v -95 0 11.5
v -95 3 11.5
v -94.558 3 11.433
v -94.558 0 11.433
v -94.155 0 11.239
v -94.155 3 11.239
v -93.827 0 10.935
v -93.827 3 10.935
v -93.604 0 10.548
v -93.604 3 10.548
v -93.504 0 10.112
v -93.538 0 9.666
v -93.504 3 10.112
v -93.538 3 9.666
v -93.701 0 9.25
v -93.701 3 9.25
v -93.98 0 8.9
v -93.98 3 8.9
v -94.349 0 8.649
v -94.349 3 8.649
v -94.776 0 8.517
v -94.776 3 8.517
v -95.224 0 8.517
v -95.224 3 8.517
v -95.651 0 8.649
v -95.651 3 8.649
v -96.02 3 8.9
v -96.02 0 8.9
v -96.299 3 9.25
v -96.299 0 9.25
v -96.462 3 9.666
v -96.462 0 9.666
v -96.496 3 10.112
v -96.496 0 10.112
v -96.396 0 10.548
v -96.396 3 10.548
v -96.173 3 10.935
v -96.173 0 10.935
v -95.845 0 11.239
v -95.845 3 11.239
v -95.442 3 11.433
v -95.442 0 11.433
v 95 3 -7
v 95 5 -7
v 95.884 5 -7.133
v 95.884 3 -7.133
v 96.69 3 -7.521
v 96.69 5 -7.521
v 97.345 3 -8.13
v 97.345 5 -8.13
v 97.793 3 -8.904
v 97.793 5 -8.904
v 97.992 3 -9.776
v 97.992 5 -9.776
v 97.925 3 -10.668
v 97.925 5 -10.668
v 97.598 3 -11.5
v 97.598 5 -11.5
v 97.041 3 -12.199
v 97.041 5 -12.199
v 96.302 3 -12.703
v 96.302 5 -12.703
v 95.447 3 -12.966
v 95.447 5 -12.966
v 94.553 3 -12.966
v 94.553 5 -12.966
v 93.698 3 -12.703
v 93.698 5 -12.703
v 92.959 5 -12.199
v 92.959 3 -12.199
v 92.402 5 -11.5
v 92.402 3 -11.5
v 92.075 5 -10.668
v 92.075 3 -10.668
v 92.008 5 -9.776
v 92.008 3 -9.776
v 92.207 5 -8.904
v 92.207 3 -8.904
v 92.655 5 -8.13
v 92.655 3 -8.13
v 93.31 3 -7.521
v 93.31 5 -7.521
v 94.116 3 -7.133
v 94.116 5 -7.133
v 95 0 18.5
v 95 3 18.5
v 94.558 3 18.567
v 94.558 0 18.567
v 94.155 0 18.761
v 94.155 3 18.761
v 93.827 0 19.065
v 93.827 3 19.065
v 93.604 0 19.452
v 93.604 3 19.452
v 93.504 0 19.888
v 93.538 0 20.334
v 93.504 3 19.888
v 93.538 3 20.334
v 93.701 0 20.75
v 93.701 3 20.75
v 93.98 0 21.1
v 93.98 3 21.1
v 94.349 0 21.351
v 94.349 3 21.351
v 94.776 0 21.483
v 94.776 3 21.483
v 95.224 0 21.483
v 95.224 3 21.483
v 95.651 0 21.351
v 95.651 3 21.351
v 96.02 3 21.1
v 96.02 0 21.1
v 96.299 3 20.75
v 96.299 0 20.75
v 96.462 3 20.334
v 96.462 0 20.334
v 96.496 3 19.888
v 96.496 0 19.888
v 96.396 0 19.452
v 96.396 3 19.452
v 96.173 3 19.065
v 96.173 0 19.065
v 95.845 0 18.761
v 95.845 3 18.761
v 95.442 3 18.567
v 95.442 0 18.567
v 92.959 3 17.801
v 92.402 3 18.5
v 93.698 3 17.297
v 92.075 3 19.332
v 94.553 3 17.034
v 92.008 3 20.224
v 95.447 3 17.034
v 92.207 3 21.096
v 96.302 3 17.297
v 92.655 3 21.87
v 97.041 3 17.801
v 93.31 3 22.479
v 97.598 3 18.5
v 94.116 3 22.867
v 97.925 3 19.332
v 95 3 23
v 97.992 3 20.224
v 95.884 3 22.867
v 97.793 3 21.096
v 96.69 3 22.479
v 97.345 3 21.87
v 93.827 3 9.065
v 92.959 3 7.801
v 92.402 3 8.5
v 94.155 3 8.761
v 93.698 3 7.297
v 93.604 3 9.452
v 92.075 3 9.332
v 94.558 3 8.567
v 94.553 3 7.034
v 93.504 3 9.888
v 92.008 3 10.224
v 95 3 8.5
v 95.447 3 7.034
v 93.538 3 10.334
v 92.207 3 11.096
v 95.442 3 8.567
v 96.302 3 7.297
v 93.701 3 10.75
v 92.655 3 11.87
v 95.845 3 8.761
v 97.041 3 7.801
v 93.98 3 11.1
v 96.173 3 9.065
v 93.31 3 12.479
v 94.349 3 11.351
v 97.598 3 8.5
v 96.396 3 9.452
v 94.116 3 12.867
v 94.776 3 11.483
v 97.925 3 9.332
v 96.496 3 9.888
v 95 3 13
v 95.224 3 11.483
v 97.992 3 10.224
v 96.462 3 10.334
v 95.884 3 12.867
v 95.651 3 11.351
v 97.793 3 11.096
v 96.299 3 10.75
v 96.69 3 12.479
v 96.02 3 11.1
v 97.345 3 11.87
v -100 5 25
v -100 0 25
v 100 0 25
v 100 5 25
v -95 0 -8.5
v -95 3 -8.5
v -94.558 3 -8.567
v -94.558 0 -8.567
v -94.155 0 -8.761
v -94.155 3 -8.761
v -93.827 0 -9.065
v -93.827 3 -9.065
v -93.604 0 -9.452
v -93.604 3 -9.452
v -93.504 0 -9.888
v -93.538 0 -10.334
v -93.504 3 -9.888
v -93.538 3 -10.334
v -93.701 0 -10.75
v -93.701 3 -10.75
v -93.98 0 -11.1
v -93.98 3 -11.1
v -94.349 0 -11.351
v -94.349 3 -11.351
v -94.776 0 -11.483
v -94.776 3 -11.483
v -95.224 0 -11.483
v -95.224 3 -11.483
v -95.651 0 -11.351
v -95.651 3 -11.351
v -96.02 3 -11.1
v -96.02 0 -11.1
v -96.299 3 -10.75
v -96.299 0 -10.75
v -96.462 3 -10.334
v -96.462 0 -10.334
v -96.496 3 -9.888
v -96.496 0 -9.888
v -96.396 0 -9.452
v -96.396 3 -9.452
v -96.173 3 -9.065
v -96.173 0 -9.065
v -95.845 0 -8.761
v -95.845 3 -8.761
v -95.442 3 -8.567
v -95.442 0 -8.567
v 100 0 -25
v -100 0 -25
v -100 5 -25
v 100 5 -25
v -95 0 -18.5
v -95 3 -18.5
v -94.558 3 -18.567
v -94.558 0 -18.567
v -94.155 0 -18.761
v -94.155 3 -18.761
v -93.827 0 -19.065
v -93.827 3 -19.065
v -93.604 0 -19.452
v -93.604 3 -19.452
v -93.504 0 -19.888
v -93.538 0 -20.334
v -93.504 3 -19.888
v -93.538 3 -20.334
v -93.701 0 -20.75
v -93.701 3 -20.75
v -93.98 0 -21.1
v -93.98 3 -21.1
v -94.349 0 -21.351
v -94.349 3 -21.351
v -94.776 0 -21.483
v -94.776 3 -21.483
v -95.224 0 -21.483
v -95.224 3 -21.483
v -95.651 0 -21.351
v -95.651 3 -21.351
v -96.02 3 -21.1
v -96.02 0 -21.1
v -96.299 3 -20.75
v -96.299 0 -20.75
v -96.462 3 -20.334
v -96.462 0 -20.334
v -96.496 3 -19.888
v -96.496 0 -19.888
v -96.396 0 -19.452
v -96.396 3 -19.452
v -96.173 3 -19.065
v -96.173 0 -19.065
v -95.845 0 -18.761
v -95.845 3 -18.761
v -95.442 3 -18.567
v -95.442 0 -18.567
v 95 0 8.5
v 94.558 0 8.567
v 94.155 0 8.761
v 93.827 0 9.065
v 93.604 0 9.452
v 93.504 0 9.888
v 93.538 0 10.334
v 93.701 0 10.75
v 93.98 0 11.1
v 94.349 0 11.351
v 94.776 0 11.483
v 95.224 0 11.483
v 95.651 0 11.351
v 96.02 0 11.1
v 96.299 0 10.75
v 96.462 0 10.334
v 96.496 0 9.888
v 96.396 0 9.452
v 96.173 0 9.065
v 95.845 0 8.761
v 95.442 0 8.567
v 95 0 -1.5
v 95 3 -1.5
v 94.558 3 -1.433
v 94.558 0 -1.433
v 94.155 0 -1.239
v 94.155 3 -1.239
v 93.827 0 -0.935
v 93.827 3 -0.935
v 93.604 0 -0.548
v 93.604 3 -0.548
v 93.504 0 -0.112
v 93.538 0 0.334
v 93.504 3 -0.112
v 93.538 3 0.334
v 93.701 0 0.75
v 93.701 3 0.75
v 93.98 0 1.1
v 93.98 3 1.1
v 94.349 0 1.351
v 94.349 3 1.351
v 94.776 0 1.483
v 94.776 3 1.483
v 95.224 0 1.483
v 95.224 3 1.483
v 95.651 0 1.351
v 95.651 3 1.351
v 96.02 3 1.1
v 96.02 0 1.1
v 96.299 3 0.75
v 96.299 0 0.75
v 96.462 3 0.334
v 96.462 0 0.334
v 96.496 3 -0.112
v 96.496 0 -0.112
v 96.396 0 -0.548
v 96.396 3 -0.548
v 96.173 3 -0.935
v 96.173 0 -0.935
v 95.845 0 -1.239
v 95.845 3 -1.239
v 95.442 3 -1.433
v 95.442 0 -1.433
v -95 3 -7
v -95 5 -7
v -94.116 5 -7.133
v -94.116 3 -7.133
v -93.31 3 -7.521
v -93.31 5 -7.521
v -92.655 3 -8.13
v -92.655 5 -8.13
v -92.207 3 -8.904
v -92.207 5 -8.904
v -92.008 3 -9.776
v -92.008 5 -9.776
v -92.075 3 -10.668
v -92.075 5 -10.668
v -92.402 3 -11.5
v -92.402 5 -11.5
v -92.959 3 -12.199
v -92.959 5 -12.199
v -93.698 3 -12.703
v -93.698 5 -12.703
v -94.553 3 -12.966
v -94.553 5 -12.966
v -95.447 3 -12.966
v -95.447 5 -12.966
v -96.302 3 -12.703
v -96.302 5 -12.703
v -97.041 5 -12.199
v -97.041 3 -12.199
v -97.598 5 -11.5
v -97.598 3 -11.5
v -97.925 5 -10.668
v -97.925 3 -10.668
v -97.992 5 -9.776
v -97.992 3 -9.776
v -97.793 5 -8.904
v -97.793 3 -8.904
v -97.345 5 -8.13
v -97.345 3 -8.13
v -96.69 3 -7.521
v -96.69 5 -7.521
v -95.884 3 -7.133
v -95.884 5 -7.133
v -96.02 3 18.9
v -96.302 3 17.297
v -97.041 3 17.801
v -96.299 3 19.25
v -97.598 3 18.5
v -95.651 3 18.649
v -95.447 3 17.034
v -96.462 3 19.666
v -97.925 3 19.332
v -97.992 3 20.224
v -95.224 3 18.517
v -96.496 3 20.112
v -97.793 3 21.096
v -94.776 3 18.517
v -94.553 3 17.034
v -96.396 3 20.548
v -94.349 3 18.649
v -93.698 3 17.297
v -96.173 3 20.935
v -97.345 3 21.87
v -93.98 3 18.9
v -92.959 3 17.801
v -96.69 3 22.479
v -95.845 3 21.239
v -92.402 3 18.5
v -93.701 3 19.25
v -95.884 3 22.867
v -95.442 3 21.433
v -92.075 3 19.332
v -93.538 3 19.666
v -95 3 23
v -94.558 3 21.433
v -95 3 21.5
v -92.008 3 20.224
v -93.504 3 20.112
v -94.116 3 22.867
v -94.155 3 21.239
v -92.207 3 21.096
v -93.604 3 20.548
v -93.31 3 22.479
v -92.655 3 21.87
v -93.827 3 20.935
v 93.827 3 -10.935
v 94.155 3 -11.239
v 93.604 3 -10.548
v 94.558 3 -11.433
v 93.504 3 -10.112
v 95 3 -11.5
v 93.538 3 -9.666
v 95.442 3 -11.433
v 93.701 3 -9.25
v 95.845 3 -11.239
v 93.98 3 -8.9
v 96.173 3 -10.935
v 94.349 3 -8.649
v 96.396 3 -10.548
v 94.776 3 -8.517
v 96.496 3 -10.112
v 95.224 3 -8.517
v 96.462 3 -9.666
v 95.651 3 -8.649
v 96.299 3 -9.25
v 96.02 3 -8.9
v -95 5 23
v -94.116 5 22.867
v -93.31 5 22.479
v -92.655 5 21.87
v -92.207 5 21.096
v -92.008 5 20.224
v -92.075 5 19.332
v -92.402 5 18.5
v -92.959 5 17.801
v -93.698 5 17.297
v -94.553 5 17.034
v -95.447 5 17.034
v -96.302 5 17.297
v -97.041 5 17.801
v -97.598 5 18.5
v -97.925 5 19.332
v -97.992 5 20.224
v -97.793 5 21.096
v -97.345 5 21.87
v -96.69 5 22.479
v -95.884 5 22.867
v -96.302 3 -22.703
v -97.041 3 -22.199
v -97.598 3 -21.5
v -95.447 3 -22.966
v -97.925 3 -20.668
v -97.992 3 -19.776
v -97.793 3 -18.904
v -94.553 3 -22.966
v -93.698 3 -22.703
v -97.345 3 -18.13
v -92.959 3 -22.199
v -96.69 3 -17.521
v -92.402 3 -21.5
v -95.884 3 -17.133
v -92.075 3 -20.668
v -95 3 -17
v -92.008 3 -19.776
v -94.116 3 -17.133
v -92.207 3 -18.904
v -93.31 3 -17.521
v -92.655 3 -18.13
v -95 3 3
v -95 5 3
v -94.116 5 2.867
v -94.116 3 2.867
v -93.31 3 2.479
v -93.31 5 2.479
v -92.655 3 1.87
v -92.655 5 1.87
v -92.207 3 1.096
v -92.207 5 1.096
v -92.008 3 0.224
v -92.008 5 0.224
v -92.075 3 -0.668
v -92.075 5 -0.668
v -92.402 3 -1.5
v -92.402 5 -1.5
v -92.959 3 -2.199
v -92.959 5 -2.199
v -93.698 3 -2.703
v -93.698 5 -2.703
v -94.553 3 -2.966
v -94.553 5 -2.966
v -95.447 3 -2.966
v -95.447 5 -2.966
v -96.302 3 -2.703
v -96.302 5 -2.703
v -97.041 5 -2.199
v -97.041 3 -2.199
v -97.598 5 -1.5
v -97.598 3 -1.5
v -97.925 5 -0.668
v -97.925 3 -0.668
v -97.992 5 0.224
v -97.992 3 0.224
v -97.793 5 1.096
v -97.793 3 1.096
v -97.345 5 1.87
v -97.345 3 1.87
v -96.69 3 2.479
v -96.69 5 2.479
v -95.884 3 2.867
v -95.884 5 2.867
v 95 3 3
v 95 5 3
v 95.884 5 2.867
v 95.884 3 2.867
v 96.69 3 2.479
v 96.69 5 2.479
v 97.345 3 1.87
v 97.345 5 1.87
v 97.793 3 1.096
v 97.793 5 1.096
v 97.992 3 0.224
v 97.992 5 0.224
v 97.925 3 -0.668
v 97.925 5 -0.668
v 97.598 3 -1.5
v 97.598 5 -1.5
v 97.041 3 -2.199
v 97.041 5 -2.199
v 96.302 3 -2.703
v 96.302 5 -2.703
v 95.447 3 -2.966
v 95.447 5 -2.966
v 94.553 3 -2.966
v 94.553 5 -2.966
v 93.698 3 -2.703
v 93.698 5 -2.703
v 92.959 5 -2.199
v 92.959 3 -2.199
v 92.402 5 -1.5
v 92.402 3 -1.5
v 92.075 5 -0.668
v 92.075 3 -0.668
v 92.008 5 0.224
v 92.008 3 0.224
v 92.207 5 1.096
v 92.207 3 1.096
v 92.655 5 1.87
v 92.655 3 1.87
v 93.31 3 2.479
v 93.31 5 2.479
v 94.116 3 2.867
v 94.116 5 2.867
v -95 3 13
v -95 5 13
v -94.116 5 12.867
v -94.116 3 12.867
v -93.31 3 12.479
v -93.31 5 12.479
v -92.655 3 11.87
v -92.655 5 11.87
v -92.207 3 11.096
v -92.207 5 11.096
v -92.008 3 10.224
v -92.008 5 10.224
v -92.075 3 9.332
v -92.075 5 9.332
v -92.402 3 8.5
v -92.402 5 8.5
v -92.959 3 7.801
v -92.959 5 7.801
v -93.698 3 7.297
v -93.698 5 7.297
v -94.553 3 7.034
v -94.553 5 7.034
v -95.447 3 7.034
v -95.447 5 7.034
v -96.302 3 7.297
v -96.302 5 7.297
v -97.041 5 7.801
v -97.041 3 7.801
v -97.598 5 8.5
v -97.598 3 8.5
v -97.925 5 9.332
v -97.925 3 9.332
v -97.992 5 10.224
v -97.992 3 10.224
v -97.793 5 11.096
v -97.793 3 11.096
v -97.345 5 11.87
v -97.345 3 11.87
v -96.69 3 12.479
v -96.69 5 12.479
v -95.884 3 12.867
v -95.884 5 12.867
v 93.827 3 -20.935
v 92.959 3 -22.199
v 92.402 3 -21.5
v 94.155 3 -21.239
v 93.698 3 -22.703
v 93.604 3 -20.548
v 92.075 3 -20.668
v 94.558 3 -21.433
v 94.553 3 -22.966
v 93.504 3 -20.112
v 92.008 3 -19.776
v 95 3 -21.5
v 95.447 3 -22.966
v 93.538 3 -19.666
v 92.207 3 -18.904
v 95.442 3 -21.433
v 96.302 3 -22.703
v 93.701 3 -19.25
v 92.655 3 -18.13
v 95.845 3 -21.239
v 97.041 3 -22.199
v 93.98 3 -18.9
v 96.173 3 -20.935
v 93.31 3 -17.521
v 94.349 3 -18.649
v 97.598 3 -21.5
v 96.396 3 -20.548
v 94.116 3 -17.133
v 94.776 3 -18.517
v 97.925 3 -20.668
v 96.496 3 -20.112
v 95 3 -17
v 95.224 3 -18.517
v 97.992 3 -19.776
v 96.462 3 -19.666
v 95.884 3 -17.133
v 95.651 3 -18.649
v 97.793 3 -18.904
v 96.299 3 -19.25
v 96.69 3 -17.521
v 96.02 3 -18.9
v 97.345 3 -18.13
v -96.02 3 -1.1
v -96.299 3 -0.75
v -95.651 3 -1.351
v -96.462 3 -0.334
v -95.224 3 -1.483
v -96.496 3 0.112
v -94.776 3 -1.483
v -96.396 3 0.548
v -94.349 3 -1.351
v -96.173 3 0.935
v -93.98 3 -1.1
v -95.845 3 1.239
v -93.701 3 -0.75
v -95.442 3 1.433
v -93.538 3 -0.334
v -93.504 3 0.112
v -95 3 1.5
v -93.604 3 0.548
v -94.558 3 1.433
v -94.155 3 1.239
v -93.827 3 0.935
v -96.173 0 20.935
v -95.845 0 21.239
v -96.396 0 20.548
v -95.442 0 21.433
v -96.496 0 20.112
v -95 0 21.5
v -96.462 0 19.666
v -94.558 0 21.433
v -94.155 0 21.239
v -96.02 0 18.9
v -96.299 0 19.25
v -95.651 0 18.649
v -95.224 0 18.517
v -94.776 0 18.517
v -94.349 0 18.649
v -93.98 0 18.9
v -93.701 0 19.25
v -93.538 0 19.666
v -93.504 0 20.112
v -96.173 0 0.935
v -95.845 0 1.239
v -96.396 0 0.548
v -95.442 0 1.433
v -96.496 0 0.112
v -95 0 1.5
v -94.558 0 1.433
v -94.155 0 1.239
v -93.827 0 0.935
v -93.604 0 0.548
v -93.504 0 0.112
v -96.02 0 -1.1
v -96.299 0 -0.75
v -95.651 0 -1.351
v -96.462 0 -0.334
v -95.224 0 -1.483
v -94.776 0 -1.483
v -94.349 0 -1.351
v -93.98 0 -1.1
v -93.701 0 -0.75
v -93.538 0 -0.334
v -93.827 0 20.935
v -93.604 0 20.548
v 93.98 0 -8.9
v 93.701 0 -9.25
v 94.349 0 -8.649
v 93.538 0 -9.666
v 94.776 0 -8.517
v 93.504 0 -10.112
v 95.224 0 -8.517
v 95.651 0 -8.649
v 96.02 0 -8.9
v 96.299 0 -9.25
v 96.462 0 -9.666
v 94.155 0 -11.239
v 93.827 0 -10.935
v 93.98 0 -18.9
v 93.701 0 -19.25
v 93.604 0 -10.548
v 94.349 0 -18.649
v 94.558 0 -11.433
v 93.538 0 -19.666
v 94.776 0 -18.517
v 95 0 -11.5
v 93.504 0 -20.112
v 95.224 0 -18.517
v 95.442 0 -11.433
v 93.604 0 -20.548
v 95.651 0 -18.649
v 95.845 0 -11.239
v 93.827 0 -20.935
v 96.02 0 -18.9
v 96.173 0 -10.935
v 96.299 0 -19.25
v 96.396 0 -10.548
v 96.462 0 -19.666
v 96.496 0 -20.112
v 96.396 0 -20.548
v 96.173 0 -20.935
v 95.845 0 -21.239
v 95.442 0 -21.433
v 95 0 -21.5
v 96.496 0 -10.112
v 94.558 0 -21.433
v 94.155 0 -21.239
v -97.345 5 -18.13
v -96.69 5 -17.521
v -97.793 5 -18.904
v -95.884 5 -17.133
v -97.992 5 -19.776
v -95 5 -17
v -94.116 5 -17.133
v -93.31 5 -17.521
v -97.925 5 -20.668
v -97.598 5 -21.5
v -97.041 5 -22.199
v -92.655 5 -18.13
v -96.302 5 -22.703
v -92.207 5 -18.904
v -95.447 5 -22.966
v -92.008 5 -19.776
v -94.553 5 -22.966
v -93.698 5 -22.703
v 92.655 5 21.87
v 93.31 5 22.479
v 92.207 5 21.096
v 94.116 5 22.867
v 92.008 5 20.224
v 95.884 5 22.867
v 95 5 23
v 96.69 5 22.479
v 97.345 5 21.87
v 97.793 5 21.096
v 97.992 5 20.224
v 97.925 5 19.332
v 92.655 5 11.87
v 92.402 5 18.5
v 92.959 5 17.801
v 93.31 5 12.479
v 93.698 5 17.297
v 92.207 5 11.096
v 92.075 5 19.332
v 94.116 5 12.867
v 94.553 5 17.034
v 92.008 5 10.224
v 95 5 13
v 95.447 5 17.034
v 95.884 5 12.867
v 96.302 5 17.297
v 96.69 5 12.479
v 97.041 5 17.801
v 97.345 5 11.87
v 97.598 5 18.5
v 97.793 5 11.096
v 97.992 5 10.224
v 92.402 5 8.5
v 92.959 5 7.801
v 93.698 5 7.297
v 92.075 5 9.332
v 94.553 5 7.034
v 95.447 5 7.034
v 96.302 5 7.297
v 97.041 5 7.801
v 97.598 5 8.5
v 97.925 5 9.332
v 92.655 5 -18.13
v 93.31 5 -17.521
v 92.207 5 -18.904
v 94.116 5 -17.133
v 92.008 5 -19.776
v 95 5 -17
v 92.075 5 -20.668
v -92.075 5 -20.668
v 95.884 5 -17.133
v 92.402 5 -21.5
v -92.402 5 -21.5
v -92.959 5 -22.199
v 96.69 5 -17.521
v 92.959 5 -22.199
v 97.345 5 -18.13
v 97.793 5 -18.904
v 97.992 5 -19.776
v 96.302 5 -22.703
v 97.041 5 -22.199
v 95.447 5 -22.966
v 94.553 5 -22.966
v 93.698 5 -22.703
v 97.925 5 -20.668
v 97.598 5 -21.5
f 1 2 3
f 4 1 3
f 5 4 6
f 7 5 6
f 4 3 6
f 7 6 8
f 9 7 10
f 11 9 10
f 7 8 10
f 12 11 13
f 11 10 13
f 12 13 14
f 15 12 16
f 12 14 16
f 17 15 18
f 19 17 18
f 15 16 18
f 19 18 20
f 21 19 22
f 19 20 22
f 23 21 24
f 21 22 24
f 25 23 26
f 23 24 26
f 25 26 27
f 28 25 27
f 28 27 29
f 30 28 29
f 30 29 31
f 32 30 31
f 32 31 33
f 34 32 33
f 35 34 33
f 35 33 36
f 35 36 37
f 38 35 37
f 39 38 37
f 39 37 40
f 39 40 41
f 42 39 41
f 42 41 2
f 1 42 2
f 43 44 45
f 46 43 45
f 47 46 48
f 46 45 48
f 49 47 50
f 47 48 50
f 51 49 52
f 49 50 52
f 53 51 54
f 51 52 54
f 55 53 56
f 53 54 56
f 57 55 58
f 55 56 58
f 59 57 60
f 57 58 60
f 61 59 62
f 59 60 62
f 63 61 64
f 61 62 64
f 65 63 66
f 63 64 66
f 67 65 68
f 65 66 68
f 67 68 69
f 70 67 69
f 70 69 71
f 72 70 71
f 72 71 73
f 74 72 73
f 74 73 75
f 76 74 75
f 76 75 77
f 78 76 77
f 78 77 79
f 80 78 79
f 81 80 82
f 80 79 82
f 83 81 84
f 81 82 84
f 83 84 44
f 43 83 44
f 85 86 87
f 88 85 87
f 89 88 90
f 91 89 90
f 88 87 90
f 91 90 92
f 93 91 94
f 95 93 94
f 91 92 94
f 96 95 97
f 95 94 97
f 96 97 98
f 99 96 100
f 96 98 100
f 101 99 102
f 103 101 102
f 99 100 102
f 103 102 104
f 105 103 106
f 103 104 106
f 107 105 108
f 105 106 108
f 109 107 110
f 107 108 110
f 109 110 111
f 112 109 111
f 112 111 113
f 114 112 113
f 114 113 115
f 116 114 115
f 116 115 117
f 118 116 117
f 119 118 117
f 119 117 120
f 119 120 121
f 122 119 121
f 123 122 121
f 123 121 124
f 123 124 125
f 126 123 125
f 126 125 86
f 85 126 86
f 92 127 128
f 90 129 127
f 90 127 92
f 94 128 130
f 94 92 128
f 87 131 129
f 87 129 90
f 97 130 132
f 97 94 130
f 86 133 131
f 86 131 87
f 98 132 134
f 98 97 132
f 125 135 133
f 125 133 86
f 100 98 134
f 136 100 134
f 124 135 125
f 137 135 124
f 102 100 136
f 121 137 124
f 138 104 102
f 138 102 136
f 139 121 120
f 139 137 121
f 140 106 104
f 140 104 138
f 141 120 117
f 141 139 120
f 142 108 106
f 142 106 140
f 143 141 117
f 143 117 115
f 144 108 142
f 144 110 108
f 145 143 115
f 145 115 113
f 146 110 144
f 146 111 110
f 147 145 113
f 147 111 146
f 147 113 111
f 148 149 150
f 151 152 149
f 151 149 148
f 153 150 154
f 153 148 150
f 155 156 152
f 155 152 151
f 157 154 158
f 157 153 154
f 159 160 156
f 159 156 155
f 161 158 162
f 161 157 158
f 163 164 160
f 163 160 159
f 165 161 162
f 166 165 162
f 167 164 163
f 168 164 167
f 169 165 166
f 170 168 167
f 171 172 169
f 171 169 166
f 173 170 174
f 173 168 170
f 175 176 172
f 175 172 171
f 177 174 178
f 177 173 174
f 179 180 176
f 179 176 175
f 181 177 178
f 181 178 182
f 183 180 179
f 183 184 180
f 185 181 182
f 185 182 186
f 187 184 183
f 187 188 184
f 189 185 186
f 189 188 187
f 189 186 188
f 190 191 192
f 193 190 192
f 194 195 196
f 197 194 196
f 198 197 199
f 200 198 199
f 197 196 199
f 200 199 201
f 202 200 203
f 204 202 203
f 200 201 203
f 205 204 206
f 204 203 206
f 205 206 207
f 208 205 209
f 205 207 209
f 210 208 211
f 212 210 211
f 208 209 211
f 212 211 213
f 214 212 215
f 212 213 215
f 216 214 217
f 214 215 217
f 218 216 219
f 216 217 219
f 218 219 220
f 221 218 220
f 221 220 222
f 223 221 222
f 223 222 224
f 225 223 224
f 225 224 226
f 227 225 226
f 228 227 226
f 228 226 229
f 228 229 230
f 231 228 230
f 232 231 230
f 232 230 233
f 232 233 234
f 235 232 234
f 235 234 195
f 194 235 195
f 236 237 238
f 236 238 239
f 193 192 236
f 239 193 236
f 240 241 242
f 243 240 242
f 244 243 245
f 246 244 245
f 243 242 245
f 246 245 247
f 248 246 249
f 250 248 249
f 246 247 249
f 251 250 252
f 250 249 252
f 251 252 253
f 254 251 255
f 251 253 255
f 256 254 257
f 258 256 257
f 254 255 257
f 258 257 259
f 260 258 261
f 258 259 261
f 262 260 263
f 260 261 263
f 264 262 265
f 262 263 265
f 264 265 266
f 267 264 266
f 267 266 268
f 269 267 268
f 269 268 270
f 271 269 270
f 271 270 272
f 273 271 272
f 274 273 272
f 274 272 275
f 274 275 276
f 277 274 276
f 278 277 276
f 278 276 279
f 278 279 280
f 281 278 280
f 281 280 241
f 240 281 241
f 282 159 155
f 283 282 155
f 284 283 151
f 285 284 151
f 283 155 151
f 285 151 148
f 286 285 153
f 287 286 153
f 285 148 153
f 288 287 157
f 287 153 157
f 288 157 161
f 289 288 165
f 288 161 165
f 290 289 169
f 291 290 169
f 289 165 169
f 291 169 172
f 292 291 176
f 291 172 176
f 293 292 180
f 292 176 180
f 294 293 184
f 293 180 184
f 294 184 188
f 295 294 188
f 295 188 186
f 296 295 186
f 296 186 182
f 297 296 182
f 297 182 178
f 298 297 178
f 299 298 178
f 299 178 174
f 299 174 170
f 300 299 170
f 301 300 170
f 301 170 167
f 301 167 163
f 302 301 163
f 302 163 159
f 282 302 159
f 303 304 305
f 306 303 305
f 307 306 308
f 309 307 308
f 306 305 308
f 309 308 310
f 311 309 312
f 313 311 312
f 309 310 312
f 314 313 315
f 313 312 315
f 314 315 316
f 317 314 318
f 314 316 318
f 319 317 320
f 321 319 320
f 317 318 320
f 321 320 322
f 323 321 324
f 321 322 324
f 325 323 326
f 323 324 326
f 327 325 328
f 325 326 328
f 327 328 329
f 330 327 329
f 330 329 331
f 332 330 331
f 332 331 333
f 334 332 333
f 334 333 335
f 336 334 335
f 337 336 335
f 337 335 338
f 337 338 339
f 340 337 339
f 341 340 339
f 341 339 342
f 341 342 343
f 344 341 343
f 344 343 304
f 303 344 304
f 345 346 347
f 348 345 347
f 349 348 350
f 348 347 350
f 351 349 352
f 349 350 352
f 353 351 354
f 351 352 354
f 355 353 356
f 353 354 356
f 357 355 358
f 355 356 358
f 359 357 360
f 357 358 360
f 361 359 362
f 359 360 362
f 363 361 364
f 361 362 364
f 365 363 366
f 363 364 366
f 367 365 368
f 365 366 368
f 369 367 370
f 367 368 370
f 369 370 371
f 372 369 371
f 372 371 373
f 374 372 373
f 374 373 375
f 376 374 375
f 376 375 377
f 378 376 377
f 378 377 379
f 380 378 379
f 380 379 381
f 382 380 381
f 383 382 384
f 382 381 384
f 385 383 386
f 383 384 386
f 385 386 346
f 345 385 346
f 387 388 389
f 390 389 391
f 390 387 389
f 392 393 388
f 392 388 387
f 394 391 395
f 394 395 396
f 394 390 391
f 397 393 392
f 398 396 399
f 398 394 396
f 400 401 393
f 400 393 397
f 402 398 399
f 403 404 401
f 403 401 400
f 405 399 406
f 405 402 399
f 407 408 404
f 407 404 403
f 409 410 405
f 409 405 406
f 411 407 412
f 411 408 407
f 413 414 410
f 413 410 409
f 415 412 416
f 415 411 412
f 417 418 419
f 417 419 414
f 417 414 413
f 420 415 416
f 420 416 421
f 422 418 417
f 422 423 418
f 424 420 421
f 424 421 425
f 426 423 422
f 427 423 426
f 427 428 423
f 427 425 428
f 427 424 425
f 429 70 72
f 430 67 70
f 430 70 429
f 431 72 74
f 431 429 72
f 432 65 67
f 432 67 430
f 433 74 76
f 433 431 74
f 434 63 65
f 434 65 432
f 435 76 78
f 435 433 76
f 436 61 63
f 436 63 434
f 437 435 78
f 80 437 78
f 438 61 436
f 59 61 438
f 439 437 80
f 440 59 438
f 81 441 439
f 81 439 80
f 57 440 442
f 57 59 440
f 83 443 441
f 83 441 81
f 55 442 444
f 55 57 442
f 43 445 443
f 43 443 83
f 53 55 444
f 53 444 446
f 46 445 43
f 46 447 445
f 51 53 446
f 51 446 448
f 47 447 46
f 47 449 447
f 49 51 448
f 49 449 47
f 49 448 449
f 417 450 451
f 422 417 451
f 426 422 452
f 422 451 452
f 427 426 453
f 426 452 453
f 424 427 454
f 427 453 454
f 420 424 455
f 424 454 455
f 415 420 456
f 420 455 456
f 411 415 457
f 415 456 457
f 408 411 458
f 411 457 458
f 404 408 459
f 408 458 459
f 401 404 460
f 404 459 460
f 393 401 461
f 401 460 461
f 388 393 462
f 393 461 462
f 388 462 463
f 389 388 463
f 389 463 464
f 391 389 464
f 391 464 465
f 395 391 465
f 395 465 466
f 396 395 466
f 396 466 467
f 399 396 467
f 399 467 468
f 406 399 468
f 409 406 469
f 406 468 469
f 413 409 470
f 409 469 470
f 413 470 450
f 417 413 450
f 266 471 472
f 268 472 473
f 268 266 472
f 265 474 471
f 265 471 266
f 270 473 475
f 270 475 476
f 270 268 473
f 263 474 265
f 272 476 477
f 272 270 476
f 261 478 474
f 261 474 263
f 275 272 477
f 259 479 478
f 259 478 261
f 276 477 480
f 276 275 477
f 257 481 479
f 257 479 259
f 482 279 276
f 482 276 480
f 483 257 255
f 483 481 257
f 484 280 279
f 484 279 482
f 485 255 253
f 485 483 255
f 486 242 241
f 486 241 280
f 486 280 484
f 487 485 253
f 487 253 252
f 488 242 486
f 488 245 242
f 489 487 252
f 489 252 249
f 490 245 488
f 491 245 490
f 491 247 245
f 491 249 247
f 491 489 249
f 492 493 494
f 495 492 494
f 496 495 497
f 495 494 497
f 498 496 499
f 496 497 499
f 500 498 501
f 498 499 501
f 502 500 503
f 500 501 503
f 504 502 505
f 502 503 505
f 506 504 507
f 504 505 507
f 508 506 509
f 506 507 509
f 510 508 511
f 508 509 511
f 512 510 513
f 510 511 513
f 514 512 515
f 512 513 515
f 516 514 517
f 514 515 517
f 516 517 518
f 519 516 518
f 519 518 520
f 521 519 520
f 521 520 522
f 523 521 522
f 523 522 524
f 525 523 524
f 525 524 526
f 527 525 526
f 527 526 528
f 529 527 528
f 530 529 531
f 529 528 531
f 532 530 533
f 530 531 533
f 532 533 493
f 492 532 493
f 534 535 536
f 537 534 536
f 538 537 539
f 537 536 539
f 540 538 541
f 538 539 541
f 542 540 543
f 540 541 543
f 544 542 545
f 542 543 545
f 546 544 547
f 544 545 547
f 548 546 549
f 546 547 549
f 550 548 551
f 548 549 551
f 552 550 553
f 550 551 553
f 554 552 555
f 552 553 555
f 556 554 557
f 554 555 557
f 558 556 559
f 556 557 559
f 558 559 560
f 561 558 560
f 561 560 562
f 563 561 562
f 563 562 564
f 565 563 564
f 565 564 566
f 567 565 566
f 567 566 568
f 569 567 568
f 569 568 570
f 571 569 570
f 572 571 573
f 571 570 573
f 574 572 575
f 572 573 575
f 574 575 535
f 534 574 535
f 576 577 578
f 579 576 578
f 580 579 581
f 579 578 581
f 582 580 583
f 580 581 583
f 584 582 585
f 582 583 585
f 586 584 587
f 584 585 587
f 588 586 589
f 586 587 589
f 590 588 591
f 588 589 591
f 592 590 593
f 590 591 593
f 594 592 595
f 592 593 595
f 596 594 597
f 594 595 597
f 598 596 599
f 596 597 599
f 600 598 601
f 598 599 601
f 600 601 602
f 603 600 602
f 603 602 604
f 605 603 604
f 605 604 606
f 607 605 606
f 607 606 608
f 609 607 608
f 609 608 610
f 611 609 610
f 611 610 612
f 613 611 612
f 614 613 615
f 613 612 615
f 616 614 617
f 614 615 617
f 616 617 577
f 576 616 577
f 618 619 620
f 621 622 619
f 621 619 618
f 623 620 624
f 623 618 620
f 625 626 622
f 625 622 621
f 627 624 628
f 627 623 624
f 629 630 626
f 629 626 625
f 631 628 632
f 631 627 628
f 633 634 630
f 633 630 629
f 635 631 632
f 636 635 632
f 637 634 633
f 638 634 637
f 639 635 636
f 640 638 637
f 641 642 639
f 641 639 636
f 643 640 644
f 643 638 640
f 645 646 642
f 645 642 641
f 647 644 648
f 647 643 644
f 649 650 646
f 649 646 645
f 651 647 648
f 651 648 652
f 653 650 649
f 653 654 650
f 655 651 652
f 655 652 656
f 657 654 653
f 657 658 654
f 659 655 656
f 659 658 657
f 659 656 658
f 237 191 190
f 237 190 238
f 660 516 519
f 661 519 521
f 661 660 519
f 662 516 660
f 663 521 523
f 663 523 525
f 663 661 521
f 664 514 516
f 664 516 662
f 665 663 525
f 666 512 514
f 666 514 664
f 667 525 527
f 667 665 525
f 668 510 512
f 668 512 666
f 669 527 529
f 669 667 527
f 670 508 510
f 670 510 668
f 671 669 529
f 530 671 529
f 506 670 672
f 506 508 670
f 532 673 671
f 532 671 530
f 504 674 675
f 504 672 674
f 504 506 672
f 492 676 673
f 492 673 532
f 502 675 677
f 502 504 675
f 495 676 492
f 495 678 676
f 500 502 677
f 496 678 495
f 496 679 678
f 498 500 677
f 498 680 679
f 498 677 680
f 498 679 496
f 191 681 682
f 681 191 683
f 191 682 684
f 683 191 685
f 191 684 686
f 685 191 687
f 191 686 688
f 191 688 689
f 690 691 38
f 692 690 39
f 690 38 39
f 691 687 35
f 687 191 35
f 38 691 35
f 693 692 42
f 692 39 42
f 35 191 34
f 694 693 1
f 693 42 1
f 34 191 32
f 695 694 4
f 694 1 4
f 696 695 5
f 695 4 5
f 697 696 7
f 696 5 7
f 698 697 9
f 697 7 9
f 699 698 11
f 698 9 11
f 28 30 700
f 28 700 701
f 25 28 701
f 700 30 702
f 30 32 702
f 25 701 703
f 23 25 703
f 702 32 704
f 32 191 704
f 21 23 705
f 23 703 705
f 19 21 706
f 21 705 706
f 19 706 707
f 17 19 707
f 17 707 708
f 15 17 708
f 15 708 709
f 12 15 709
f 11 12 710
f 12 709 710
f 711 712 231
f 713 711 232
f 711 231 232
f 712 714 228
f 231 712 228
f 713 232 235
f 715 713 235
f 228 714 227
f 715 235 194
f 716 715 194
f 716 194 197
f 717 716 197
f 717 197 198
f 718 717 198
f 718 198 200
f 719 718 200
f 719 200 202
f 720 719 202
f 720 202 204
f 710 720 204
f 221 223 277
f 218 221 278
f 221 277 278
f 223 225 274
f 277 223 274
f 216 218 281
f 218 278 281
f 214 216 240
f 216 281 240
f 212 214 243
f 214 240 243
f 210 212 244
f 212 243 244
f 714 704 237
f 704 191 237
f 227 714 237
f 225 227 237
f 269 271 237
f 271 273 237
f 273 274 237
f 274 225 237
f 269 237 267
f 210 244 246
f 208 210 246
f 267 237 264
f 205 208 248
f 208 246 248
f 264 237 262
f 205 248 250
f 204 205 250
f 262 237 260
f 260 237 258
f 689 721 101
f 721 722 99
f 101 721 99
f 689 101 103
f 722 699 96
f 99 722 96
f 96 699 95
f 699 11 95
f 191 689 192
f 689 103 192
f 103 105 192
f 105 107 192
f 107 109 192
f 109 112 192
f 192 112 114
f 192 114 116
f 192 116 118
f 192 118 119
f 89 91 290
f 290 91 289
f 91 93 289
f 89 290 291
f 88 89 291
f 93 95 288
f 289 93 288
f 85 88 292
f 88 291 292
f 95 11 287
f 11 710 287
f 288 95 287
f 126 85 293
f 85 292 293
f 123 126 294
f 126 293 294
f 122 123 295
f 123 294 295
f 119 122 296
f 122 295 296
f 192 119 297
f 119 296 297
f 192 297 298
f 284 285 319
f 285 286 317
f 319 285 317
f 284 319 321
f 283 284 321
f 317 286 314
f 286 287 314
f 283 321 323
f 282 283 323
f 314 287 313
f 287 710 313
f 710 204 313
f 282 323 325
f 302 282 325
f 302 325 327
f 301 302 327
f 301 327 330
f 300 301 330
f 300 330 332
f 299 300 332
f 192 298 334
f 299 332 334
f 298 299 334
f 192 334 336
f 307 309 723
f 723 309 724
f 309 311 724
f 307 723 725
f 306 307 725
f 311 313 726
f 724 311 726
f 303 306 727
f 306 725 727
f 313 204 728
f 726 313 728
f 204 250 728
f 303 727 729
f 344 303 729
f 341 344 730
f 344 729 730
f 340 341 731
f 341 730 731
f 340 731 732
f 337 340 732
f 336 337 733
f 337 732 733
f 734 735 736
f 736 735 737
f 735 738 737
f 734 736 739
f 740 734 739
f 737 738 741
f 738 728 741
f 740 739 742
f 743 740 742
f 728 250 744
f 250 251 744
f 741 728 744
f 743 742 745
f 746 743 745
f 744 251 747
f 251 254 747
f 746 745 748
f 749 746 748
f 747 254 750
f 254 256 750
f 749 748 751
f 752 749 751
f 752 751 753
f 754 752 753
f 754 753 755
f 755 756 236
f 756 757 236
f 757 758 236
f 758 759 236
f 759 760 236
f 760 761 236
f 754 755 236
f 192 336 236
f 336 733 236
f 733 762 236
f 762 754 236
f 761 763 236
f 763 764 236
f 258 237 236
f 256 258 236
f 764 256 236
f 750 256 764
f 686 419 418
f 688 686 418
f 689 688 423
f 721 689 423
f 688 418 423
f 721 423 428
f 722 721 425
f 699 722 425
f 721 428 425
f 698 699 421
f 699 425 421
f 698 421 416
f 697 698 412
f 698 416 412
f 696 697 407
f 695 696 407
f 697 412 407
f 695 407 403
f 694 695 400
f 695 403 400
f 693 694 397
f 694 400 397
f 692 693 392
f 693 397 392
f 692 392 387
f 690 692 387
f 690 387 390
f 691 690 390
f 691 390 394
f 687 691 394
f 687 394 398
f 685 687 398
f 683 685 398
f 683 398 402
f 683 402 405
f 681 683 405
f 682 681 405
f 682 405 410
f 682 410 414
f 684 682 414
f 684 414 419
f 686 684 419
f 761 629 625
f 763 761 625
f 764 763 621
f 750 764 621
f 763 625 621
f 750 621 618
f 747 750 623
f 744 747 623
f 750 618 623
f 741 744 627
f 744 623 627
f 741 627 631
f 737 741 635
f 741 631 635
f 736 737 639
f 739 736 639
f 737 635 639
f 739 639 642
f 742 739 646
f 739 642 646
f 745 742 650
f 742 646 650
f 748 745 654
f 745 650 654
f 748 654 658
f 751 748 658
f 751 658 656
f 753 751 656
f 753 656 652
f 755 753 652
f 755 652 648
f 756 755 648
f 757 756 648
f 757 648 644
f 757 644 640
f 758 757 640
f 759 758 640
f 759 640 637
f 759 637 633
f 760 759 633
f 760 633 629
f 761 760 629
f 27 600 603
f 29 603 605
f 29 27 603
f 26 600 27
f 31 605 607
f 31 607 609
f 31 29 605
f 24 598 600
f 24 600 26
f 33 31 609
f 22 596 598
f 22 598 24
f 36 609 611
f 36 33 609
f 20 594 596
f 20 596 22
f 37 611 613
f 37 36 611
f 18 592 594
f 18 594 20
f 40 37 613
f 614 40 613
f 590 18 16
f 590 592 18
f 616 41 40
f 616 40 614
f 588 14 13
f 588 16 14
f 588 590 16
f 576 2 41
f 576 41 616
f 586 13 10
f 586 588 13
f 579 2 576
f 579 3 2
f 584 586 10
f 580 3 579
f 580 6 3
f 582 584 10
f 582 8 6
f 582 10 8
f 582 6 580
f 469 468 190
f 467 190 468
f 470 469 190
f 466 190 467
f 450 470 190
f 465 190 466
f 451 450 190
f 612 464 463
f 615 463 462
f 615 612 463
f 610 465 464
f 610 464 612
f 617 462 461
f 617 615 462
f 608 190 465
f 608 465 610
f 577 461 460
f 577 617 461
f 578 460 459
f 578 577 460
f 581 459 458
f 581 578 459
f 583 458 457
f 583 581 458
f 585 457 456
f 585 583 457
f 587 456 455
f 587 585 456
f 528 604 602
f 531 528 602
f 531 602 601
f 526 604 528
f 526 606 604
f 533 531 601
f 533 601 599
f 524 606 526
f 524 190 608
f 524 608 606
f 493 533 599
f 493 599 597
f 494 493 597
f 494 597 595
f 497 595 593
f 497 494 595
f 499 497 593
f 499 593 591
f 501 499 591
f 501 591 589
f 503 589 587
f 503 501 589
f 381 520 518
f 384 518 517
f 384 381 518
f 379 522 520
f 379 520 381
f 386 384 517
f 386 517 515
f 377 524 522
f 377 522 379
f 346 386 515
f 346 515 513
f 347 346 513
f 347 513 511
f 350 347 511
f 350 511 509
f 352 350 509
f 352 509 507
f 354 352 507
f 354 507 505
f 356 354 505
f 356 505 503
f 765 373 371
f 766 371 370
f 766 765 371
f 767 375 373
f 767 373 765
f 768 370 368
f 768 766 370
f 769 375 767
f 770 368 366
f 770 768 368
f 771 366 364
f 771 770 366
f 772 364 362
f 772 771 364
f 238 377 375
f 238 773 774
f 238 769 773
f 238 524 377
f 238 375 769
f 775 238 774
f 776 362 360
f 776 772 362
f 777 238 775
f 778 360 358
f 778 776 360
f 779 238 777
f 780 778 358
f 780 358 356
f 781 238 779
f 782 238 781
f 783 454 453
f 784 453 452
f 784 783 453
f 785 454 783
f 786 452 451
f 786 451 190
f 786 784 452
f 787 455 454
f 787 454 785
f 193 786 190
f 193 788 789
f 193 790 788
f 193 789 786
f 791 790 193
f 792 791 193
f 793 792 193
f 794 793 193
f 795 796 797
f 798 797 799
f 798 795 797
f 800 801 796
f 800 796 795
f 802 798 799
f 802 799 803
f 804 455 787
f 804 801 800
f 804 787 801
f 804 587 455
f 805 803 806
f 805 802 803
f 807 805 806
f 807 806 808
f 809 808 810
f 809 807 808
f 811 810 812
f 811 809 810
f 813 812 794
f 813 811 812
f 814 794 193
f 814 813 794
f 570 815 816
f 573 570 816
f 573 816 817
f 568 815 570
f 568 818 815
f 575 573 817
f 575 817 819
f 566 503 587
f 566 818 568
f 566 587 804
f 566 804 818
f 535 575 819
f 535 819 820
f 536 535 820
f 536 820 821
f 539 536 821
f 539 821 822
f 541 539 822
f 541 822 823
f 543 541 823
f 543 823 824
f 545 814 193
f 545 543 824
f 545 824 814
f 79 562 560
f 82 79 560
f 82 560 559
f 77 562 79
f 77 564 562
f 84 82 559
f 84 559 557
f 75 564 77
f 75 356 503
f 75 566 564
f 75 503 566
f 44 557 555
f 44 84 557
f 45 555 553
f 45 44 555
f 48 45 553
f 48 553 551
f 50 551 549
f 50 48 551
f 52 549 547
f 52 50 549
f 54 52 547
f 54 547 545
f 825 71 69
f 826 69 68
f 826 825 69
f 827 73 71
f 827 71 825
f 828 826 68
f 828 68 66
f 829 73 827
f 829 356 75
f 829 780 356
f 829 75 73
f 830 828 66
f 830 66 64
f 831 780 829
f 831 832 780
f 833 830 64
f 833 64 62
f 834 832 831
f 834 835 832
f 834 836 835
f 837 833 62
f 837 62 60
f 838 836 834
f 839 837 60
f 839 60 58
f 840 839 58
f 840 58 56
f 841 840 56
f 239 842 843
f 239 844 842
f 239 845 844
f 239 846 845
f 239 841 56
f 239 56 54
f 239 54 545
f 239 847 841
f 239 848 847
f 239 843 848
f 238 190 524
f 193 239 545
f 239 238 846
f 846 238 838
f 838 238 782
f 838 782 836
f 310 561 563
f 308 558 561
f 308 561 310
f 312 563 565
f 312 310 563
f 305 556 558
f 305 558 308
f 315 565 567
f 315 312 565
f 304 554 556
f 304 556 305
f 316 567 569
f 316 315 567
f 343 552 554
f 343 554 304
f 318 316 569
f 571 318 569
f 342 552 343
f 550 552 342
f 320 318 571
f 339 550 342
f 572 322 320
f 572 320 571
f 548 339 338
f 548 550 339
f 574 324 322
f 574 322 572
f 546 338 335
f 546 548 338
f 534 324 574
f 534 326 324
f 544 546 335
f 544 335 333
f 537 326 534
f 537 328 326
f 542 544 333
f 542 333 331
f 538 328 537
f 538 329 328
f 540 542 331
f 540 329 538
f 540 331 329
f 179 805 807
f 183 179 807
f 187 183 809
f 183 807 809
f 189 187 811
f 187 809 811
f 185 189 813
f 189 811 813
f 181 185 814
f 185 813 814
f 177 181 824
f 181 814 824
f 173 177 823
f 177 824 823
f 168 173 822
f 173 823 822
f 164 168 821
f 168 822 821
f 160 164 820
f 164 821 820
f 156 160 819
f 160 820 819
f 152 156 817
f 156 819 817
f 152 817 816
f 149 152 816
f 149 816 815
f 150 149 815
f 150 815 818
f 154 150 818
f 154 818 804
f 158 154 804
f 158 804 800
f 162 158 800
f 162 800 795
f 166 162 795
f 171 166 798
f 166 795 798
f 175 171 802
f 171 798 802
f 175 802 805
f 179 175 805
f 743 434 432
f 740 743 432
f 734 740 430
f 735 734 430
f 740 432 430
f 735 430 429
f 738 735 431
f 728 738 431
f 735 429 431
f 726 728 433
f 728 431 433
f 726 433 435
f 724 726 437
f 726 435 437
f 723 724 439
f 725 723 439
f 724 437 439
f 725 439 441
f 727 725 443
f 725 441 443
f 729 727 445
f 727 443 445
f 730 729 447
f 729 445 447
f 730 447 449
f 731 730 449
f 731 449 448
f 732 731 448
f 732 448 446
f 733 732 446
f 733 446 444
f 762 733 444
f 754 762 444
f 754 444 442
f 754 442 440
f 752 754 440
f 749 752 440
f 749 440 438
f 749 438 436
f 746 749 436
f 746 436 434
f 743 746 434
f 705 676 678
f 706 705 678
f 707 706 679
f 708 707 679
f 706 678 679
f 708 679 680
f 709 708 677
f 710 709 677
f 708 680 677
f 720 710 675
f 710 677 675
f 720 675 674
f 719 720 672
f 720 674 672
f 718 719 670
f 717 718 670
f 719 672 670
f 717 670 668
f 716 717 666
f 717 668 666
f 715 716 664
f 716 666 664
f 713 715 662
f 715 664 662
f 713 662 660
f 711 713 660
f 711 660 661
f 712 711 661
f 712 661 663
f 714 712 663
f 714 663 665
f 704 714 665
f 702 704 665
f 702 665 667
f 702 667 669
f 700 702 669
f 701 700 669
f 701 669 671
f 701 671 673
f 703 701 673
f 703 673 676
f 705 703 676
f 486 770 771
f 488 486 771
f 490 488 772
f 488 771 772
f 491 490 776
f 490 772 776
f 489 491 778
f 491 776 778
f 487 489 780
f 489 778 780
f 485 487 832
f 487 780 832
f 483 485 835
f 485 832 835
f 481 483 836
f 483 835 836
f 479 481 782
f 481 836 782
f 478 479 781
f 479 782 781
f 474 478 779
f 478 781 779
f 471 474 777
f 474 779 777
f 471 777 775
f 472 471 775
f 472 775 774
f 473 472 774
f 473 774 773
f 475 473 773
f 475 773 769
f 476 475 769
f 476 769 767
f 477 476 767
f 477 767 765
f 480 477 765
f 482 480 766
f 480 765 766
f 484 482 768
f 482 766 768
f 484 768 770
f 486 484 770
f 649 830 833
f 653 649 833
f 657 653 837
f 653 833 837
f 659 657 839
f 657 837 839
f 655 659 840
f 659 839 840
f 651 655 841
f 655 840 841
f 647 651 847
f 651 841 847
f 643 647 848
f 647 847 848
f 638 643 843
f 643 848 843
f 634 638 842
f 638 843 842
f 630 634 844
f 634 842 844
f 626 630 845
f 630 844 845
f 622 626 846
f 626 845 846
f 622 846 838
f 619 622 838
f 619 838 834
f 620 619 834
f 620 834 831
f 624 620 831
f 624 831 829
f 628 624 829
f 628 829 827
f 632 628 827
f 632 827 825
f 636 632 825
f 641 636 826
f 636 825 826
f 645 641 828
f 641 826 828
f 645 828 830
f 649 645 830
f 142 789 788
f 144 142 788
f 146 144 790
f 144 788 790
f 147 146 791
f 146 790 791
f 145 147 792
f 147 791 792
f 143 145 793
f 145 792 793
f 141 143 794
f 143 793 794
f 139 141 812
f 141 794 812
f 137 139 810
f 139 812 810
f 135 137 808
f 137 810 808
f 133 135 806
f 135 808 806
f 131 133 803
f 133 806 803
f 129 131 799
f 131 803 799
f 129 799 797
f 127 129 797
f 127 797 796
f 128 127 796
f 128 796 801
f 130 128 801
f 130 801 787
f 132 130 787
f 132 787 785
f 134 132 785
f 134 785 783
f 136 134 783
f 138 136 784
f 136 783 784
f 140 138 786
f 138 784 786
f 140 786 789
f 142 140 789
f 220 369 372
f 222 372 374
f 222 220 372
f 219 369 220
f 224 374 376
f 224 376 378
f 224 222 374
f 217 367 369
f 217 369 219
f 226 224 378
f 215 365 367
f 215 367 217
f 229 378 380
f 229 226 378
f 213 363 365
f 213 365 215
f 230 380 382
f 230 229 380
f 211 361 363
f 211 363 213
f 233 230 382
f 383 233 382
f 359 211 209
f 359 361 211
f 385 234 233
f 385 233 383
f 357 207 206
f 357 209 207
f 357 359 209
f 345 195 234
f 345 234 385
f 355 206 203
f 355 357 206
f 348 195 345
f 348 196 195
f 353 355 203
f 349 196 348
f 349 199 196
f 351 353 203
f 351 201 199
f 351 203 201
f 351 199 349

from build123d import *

# Parameters (mm, degrees)
SKETCH3_W           = 200
SKETCH3_H           = 50
BOSS_EXTRUDE1_DEPTH = 5
SKETCH4_R           = 1.5
CUT_EXTRUDE1_DEPTH  = 5
SKETCH5_R           = 3
SKETCH5_R_2         = 1.5
CUT_EXTRUDE2_DEPTH  = 2


with BuildPart() as part:
    # Sketch3 → Boss-Extrude1 (new body)
    with BuildSketch(Plane(origin=(0, 0, 0), x_dir=(1, 0, 0), z_dir=(0, 1, 0))):
        Rectangle(SKETCH3_W, SKETCH3_H)
    extrude(amount=BOSS_EXTRUDE1_DEPTH)

    # Sketch4 → Cut-Extrude1 (cut)
    with BuildSketch(Plane(origin=(0, 5, 0), x_dir=(1, 0, 0), z_dir=(0, 1, 0))):
        with Locations(Location((-95, 20, 0), (0, 0, 270))):
            Circle(SKETCH4_R)
        with Locations(Location((-95, 10, 0), (0, 0, 270))):
            Circle(SKETCH4_R)
        with Locations(Location((-95, 0, 0), (0, 0, 270))):
            Circle(SKETCH4_R)
        with Locations(Location((-95, -10, 0), (0, 0, 270))):
            Circle(SKETCH4_R)
        with Locations(Location((-95, -20, 0), (0, 0, 270))):
            Circle(SKETCH4_R)
        with Locations(Location((95, -20, 0), (0, 0, 90))):
            Circle(SKETCH4_R)
        with Locations(Location((95, -10, 0), (0, 0, 90))):
            Circle(SKETCH4_R)
        with Locations(Location((95, 0, 0), (0, 0, 90))):
            Circle(SKETCH4_R)
        with Locations(Location((95, 20, 0), (0, 0, 90))):
            Circle(SKETCH4_R)
        with Locations(Location((95, 10, 0), (0, 0, 90))):
            Circle(SKETCH4_R)
    extrude(amount=-CUT_EXTRUDE1_DEPTH, mode=Mode.SUBTRACT)

    # Sketch5 → Cut-Extrude2 (cut)
    # profile 1 of 10: a face of its own
    with BuildSketch(Plane(origin=(0, 5, 0), x_dir=(1, 0, 0), z_dir=(0, 1, 0))):
        with Locations(Location((-95, 20, 0), (0, 0, 270))):
            Circle(SKETCH5_R)
        with Locations(Location((-95, 20, 0), (0, 0, 270))):
            Circle(SKETCH5_R_2, mode=Mode.SUBTRACT)
    # profile 2 of 10: a face of its own
    with BuildSketch(Plane(origin=(0, 5, 0), x_dir=(1, 0, 0), z_dir=(0, 1, 0))):
        with Locations(Location((95, 20, 0), (0, 0, 270))):
            Circle(SKETCH5_R)
        with Locations(Location((95, 20, 0), (0, 0, 270))):
            Circle(SKETCH5_R_2, mode=Mode.SUBTRACT)
    # profile 3 of 10: a face of its own
    with BuildSketch(Plane(origin=(0, 5, 0), x_dir=(1, 0, 0), z_dir=(0, 1, 0))):
        with Locations(Location((-95, 10, 0), (0, 0, 270))):
            Circle(SKETCH5_R)
        with Locations(Location((-95, 10, 0), (0, 0, 270))):
            Circle(SKETCH5_R_2, mode=Mode.SUBTRACT)
    # profile 4 of 10: a face of its own
    with BuildSketch(Plane(origin=(0, 5, 0), x_dir=(1, 0, 0), z_dir=(0, 1, 0))):
        with Locations(Location((95, 10, 0), (0, 0, 270))):
            Circle(SKETCH5_R)
        with Locations(Location((95, 10, 0), (0, 0, 270))):
            Circle(SKETCH5_R_2, mode=Mode.SUBTRACT)
    # profile 5 of 10: a face of its own
    with BuildSketch(Plane(origin=(0, 5, 0), x_dir=(1, 0, 0), z_dir=(0, 1, 0))):
        with Locations(Location((-95, 0, 0), (0, 0, 270))):
            Circle(SKETCH5_R)
        with Locations(Location((-95, 0, 0), (0, 0, 270))):
            Circle(SKETCH5_R_2, mode=Mode.SUBTRACT)
    # profile 6 of 10: a face of its own
    with BuildSketch(Plane(origin=(0, 5, 0), x_dir=(1, 0, 0), z_dir=(0, 1, 0))):
        with Locations(Location((95, 0, 0), (0, 0, 270))):
            Circle(SKETCH5_R)
        with Locations(Location((95, 0, 0), (0, 0, 270))):
            Circle(SKETCH5_R_2, mode=Mode.SUBTRACT)
    # profile 7 of 10: a face of its own
    with BuildSketch(Plane(origin=(0, 5, 0), x_dir=(1, 0, 0), z_dir=(0, 1, 0))):
        with Locations(Location((-95, -10, 0), (0, 0, 270))):
            Circle(SKETCH5_R)
        with Locations(Location((-95, -10, 0), (0, 0, 270))):
            Circle(SKETCH5_R_2, mode=Mode.SUBTRACT)
    # profile 8 of 10: a face of its own
    with BuildSketch(Plane(origin=(0, 5, 0), x_dir=(1, 0, 0), z_dir=(0, 1, 0))):
        with Locations(Location((95, -10, 0), (0, 0, 270))):
            Circle(SKETCH5_R)
        with Locations(Location((95, -10, 0), (0, 0, 270))):
            Circle(SKETCH5_R_2, mode=Mode.SUBTRACT)
    # profile 9 of 10: a face of its own
    with BuildSketch(Plane(origin=(0, 5, 0), x_dir=(1, 0, 0), z_dir=(0, 1, 0))):
        with Locations(Location((-95, -20, 0), (0, 0, 270))):
            Circle(SKETCH5_R)
        with Locations(Location((-95, -20, 0), (0, 0, 270))):
            Circle(SKETCH5_R_2, mode=Mode.SUBTRACT)
    # profile 10 of 10: a face of its own
    with BuildSketch(Plane(origin=(0, 5, 0), x_dir=(1, 0, 0), z_dir=(0, 1, 0))):
        with Locations(Location((95, -20, 0), (0, 0, 270))):
            Circle(SKETCH5_R)
        with Locations(Location((95, -20, 0), (0, 0, 270))):
            Circle(SKETCH5_R_2, mode=Mode.SUBTRACT)
    extrude(amount=-CUT_EXTRUDE2_DEPTH, mode=Mode.SUBTRACT)


solid = part.part
